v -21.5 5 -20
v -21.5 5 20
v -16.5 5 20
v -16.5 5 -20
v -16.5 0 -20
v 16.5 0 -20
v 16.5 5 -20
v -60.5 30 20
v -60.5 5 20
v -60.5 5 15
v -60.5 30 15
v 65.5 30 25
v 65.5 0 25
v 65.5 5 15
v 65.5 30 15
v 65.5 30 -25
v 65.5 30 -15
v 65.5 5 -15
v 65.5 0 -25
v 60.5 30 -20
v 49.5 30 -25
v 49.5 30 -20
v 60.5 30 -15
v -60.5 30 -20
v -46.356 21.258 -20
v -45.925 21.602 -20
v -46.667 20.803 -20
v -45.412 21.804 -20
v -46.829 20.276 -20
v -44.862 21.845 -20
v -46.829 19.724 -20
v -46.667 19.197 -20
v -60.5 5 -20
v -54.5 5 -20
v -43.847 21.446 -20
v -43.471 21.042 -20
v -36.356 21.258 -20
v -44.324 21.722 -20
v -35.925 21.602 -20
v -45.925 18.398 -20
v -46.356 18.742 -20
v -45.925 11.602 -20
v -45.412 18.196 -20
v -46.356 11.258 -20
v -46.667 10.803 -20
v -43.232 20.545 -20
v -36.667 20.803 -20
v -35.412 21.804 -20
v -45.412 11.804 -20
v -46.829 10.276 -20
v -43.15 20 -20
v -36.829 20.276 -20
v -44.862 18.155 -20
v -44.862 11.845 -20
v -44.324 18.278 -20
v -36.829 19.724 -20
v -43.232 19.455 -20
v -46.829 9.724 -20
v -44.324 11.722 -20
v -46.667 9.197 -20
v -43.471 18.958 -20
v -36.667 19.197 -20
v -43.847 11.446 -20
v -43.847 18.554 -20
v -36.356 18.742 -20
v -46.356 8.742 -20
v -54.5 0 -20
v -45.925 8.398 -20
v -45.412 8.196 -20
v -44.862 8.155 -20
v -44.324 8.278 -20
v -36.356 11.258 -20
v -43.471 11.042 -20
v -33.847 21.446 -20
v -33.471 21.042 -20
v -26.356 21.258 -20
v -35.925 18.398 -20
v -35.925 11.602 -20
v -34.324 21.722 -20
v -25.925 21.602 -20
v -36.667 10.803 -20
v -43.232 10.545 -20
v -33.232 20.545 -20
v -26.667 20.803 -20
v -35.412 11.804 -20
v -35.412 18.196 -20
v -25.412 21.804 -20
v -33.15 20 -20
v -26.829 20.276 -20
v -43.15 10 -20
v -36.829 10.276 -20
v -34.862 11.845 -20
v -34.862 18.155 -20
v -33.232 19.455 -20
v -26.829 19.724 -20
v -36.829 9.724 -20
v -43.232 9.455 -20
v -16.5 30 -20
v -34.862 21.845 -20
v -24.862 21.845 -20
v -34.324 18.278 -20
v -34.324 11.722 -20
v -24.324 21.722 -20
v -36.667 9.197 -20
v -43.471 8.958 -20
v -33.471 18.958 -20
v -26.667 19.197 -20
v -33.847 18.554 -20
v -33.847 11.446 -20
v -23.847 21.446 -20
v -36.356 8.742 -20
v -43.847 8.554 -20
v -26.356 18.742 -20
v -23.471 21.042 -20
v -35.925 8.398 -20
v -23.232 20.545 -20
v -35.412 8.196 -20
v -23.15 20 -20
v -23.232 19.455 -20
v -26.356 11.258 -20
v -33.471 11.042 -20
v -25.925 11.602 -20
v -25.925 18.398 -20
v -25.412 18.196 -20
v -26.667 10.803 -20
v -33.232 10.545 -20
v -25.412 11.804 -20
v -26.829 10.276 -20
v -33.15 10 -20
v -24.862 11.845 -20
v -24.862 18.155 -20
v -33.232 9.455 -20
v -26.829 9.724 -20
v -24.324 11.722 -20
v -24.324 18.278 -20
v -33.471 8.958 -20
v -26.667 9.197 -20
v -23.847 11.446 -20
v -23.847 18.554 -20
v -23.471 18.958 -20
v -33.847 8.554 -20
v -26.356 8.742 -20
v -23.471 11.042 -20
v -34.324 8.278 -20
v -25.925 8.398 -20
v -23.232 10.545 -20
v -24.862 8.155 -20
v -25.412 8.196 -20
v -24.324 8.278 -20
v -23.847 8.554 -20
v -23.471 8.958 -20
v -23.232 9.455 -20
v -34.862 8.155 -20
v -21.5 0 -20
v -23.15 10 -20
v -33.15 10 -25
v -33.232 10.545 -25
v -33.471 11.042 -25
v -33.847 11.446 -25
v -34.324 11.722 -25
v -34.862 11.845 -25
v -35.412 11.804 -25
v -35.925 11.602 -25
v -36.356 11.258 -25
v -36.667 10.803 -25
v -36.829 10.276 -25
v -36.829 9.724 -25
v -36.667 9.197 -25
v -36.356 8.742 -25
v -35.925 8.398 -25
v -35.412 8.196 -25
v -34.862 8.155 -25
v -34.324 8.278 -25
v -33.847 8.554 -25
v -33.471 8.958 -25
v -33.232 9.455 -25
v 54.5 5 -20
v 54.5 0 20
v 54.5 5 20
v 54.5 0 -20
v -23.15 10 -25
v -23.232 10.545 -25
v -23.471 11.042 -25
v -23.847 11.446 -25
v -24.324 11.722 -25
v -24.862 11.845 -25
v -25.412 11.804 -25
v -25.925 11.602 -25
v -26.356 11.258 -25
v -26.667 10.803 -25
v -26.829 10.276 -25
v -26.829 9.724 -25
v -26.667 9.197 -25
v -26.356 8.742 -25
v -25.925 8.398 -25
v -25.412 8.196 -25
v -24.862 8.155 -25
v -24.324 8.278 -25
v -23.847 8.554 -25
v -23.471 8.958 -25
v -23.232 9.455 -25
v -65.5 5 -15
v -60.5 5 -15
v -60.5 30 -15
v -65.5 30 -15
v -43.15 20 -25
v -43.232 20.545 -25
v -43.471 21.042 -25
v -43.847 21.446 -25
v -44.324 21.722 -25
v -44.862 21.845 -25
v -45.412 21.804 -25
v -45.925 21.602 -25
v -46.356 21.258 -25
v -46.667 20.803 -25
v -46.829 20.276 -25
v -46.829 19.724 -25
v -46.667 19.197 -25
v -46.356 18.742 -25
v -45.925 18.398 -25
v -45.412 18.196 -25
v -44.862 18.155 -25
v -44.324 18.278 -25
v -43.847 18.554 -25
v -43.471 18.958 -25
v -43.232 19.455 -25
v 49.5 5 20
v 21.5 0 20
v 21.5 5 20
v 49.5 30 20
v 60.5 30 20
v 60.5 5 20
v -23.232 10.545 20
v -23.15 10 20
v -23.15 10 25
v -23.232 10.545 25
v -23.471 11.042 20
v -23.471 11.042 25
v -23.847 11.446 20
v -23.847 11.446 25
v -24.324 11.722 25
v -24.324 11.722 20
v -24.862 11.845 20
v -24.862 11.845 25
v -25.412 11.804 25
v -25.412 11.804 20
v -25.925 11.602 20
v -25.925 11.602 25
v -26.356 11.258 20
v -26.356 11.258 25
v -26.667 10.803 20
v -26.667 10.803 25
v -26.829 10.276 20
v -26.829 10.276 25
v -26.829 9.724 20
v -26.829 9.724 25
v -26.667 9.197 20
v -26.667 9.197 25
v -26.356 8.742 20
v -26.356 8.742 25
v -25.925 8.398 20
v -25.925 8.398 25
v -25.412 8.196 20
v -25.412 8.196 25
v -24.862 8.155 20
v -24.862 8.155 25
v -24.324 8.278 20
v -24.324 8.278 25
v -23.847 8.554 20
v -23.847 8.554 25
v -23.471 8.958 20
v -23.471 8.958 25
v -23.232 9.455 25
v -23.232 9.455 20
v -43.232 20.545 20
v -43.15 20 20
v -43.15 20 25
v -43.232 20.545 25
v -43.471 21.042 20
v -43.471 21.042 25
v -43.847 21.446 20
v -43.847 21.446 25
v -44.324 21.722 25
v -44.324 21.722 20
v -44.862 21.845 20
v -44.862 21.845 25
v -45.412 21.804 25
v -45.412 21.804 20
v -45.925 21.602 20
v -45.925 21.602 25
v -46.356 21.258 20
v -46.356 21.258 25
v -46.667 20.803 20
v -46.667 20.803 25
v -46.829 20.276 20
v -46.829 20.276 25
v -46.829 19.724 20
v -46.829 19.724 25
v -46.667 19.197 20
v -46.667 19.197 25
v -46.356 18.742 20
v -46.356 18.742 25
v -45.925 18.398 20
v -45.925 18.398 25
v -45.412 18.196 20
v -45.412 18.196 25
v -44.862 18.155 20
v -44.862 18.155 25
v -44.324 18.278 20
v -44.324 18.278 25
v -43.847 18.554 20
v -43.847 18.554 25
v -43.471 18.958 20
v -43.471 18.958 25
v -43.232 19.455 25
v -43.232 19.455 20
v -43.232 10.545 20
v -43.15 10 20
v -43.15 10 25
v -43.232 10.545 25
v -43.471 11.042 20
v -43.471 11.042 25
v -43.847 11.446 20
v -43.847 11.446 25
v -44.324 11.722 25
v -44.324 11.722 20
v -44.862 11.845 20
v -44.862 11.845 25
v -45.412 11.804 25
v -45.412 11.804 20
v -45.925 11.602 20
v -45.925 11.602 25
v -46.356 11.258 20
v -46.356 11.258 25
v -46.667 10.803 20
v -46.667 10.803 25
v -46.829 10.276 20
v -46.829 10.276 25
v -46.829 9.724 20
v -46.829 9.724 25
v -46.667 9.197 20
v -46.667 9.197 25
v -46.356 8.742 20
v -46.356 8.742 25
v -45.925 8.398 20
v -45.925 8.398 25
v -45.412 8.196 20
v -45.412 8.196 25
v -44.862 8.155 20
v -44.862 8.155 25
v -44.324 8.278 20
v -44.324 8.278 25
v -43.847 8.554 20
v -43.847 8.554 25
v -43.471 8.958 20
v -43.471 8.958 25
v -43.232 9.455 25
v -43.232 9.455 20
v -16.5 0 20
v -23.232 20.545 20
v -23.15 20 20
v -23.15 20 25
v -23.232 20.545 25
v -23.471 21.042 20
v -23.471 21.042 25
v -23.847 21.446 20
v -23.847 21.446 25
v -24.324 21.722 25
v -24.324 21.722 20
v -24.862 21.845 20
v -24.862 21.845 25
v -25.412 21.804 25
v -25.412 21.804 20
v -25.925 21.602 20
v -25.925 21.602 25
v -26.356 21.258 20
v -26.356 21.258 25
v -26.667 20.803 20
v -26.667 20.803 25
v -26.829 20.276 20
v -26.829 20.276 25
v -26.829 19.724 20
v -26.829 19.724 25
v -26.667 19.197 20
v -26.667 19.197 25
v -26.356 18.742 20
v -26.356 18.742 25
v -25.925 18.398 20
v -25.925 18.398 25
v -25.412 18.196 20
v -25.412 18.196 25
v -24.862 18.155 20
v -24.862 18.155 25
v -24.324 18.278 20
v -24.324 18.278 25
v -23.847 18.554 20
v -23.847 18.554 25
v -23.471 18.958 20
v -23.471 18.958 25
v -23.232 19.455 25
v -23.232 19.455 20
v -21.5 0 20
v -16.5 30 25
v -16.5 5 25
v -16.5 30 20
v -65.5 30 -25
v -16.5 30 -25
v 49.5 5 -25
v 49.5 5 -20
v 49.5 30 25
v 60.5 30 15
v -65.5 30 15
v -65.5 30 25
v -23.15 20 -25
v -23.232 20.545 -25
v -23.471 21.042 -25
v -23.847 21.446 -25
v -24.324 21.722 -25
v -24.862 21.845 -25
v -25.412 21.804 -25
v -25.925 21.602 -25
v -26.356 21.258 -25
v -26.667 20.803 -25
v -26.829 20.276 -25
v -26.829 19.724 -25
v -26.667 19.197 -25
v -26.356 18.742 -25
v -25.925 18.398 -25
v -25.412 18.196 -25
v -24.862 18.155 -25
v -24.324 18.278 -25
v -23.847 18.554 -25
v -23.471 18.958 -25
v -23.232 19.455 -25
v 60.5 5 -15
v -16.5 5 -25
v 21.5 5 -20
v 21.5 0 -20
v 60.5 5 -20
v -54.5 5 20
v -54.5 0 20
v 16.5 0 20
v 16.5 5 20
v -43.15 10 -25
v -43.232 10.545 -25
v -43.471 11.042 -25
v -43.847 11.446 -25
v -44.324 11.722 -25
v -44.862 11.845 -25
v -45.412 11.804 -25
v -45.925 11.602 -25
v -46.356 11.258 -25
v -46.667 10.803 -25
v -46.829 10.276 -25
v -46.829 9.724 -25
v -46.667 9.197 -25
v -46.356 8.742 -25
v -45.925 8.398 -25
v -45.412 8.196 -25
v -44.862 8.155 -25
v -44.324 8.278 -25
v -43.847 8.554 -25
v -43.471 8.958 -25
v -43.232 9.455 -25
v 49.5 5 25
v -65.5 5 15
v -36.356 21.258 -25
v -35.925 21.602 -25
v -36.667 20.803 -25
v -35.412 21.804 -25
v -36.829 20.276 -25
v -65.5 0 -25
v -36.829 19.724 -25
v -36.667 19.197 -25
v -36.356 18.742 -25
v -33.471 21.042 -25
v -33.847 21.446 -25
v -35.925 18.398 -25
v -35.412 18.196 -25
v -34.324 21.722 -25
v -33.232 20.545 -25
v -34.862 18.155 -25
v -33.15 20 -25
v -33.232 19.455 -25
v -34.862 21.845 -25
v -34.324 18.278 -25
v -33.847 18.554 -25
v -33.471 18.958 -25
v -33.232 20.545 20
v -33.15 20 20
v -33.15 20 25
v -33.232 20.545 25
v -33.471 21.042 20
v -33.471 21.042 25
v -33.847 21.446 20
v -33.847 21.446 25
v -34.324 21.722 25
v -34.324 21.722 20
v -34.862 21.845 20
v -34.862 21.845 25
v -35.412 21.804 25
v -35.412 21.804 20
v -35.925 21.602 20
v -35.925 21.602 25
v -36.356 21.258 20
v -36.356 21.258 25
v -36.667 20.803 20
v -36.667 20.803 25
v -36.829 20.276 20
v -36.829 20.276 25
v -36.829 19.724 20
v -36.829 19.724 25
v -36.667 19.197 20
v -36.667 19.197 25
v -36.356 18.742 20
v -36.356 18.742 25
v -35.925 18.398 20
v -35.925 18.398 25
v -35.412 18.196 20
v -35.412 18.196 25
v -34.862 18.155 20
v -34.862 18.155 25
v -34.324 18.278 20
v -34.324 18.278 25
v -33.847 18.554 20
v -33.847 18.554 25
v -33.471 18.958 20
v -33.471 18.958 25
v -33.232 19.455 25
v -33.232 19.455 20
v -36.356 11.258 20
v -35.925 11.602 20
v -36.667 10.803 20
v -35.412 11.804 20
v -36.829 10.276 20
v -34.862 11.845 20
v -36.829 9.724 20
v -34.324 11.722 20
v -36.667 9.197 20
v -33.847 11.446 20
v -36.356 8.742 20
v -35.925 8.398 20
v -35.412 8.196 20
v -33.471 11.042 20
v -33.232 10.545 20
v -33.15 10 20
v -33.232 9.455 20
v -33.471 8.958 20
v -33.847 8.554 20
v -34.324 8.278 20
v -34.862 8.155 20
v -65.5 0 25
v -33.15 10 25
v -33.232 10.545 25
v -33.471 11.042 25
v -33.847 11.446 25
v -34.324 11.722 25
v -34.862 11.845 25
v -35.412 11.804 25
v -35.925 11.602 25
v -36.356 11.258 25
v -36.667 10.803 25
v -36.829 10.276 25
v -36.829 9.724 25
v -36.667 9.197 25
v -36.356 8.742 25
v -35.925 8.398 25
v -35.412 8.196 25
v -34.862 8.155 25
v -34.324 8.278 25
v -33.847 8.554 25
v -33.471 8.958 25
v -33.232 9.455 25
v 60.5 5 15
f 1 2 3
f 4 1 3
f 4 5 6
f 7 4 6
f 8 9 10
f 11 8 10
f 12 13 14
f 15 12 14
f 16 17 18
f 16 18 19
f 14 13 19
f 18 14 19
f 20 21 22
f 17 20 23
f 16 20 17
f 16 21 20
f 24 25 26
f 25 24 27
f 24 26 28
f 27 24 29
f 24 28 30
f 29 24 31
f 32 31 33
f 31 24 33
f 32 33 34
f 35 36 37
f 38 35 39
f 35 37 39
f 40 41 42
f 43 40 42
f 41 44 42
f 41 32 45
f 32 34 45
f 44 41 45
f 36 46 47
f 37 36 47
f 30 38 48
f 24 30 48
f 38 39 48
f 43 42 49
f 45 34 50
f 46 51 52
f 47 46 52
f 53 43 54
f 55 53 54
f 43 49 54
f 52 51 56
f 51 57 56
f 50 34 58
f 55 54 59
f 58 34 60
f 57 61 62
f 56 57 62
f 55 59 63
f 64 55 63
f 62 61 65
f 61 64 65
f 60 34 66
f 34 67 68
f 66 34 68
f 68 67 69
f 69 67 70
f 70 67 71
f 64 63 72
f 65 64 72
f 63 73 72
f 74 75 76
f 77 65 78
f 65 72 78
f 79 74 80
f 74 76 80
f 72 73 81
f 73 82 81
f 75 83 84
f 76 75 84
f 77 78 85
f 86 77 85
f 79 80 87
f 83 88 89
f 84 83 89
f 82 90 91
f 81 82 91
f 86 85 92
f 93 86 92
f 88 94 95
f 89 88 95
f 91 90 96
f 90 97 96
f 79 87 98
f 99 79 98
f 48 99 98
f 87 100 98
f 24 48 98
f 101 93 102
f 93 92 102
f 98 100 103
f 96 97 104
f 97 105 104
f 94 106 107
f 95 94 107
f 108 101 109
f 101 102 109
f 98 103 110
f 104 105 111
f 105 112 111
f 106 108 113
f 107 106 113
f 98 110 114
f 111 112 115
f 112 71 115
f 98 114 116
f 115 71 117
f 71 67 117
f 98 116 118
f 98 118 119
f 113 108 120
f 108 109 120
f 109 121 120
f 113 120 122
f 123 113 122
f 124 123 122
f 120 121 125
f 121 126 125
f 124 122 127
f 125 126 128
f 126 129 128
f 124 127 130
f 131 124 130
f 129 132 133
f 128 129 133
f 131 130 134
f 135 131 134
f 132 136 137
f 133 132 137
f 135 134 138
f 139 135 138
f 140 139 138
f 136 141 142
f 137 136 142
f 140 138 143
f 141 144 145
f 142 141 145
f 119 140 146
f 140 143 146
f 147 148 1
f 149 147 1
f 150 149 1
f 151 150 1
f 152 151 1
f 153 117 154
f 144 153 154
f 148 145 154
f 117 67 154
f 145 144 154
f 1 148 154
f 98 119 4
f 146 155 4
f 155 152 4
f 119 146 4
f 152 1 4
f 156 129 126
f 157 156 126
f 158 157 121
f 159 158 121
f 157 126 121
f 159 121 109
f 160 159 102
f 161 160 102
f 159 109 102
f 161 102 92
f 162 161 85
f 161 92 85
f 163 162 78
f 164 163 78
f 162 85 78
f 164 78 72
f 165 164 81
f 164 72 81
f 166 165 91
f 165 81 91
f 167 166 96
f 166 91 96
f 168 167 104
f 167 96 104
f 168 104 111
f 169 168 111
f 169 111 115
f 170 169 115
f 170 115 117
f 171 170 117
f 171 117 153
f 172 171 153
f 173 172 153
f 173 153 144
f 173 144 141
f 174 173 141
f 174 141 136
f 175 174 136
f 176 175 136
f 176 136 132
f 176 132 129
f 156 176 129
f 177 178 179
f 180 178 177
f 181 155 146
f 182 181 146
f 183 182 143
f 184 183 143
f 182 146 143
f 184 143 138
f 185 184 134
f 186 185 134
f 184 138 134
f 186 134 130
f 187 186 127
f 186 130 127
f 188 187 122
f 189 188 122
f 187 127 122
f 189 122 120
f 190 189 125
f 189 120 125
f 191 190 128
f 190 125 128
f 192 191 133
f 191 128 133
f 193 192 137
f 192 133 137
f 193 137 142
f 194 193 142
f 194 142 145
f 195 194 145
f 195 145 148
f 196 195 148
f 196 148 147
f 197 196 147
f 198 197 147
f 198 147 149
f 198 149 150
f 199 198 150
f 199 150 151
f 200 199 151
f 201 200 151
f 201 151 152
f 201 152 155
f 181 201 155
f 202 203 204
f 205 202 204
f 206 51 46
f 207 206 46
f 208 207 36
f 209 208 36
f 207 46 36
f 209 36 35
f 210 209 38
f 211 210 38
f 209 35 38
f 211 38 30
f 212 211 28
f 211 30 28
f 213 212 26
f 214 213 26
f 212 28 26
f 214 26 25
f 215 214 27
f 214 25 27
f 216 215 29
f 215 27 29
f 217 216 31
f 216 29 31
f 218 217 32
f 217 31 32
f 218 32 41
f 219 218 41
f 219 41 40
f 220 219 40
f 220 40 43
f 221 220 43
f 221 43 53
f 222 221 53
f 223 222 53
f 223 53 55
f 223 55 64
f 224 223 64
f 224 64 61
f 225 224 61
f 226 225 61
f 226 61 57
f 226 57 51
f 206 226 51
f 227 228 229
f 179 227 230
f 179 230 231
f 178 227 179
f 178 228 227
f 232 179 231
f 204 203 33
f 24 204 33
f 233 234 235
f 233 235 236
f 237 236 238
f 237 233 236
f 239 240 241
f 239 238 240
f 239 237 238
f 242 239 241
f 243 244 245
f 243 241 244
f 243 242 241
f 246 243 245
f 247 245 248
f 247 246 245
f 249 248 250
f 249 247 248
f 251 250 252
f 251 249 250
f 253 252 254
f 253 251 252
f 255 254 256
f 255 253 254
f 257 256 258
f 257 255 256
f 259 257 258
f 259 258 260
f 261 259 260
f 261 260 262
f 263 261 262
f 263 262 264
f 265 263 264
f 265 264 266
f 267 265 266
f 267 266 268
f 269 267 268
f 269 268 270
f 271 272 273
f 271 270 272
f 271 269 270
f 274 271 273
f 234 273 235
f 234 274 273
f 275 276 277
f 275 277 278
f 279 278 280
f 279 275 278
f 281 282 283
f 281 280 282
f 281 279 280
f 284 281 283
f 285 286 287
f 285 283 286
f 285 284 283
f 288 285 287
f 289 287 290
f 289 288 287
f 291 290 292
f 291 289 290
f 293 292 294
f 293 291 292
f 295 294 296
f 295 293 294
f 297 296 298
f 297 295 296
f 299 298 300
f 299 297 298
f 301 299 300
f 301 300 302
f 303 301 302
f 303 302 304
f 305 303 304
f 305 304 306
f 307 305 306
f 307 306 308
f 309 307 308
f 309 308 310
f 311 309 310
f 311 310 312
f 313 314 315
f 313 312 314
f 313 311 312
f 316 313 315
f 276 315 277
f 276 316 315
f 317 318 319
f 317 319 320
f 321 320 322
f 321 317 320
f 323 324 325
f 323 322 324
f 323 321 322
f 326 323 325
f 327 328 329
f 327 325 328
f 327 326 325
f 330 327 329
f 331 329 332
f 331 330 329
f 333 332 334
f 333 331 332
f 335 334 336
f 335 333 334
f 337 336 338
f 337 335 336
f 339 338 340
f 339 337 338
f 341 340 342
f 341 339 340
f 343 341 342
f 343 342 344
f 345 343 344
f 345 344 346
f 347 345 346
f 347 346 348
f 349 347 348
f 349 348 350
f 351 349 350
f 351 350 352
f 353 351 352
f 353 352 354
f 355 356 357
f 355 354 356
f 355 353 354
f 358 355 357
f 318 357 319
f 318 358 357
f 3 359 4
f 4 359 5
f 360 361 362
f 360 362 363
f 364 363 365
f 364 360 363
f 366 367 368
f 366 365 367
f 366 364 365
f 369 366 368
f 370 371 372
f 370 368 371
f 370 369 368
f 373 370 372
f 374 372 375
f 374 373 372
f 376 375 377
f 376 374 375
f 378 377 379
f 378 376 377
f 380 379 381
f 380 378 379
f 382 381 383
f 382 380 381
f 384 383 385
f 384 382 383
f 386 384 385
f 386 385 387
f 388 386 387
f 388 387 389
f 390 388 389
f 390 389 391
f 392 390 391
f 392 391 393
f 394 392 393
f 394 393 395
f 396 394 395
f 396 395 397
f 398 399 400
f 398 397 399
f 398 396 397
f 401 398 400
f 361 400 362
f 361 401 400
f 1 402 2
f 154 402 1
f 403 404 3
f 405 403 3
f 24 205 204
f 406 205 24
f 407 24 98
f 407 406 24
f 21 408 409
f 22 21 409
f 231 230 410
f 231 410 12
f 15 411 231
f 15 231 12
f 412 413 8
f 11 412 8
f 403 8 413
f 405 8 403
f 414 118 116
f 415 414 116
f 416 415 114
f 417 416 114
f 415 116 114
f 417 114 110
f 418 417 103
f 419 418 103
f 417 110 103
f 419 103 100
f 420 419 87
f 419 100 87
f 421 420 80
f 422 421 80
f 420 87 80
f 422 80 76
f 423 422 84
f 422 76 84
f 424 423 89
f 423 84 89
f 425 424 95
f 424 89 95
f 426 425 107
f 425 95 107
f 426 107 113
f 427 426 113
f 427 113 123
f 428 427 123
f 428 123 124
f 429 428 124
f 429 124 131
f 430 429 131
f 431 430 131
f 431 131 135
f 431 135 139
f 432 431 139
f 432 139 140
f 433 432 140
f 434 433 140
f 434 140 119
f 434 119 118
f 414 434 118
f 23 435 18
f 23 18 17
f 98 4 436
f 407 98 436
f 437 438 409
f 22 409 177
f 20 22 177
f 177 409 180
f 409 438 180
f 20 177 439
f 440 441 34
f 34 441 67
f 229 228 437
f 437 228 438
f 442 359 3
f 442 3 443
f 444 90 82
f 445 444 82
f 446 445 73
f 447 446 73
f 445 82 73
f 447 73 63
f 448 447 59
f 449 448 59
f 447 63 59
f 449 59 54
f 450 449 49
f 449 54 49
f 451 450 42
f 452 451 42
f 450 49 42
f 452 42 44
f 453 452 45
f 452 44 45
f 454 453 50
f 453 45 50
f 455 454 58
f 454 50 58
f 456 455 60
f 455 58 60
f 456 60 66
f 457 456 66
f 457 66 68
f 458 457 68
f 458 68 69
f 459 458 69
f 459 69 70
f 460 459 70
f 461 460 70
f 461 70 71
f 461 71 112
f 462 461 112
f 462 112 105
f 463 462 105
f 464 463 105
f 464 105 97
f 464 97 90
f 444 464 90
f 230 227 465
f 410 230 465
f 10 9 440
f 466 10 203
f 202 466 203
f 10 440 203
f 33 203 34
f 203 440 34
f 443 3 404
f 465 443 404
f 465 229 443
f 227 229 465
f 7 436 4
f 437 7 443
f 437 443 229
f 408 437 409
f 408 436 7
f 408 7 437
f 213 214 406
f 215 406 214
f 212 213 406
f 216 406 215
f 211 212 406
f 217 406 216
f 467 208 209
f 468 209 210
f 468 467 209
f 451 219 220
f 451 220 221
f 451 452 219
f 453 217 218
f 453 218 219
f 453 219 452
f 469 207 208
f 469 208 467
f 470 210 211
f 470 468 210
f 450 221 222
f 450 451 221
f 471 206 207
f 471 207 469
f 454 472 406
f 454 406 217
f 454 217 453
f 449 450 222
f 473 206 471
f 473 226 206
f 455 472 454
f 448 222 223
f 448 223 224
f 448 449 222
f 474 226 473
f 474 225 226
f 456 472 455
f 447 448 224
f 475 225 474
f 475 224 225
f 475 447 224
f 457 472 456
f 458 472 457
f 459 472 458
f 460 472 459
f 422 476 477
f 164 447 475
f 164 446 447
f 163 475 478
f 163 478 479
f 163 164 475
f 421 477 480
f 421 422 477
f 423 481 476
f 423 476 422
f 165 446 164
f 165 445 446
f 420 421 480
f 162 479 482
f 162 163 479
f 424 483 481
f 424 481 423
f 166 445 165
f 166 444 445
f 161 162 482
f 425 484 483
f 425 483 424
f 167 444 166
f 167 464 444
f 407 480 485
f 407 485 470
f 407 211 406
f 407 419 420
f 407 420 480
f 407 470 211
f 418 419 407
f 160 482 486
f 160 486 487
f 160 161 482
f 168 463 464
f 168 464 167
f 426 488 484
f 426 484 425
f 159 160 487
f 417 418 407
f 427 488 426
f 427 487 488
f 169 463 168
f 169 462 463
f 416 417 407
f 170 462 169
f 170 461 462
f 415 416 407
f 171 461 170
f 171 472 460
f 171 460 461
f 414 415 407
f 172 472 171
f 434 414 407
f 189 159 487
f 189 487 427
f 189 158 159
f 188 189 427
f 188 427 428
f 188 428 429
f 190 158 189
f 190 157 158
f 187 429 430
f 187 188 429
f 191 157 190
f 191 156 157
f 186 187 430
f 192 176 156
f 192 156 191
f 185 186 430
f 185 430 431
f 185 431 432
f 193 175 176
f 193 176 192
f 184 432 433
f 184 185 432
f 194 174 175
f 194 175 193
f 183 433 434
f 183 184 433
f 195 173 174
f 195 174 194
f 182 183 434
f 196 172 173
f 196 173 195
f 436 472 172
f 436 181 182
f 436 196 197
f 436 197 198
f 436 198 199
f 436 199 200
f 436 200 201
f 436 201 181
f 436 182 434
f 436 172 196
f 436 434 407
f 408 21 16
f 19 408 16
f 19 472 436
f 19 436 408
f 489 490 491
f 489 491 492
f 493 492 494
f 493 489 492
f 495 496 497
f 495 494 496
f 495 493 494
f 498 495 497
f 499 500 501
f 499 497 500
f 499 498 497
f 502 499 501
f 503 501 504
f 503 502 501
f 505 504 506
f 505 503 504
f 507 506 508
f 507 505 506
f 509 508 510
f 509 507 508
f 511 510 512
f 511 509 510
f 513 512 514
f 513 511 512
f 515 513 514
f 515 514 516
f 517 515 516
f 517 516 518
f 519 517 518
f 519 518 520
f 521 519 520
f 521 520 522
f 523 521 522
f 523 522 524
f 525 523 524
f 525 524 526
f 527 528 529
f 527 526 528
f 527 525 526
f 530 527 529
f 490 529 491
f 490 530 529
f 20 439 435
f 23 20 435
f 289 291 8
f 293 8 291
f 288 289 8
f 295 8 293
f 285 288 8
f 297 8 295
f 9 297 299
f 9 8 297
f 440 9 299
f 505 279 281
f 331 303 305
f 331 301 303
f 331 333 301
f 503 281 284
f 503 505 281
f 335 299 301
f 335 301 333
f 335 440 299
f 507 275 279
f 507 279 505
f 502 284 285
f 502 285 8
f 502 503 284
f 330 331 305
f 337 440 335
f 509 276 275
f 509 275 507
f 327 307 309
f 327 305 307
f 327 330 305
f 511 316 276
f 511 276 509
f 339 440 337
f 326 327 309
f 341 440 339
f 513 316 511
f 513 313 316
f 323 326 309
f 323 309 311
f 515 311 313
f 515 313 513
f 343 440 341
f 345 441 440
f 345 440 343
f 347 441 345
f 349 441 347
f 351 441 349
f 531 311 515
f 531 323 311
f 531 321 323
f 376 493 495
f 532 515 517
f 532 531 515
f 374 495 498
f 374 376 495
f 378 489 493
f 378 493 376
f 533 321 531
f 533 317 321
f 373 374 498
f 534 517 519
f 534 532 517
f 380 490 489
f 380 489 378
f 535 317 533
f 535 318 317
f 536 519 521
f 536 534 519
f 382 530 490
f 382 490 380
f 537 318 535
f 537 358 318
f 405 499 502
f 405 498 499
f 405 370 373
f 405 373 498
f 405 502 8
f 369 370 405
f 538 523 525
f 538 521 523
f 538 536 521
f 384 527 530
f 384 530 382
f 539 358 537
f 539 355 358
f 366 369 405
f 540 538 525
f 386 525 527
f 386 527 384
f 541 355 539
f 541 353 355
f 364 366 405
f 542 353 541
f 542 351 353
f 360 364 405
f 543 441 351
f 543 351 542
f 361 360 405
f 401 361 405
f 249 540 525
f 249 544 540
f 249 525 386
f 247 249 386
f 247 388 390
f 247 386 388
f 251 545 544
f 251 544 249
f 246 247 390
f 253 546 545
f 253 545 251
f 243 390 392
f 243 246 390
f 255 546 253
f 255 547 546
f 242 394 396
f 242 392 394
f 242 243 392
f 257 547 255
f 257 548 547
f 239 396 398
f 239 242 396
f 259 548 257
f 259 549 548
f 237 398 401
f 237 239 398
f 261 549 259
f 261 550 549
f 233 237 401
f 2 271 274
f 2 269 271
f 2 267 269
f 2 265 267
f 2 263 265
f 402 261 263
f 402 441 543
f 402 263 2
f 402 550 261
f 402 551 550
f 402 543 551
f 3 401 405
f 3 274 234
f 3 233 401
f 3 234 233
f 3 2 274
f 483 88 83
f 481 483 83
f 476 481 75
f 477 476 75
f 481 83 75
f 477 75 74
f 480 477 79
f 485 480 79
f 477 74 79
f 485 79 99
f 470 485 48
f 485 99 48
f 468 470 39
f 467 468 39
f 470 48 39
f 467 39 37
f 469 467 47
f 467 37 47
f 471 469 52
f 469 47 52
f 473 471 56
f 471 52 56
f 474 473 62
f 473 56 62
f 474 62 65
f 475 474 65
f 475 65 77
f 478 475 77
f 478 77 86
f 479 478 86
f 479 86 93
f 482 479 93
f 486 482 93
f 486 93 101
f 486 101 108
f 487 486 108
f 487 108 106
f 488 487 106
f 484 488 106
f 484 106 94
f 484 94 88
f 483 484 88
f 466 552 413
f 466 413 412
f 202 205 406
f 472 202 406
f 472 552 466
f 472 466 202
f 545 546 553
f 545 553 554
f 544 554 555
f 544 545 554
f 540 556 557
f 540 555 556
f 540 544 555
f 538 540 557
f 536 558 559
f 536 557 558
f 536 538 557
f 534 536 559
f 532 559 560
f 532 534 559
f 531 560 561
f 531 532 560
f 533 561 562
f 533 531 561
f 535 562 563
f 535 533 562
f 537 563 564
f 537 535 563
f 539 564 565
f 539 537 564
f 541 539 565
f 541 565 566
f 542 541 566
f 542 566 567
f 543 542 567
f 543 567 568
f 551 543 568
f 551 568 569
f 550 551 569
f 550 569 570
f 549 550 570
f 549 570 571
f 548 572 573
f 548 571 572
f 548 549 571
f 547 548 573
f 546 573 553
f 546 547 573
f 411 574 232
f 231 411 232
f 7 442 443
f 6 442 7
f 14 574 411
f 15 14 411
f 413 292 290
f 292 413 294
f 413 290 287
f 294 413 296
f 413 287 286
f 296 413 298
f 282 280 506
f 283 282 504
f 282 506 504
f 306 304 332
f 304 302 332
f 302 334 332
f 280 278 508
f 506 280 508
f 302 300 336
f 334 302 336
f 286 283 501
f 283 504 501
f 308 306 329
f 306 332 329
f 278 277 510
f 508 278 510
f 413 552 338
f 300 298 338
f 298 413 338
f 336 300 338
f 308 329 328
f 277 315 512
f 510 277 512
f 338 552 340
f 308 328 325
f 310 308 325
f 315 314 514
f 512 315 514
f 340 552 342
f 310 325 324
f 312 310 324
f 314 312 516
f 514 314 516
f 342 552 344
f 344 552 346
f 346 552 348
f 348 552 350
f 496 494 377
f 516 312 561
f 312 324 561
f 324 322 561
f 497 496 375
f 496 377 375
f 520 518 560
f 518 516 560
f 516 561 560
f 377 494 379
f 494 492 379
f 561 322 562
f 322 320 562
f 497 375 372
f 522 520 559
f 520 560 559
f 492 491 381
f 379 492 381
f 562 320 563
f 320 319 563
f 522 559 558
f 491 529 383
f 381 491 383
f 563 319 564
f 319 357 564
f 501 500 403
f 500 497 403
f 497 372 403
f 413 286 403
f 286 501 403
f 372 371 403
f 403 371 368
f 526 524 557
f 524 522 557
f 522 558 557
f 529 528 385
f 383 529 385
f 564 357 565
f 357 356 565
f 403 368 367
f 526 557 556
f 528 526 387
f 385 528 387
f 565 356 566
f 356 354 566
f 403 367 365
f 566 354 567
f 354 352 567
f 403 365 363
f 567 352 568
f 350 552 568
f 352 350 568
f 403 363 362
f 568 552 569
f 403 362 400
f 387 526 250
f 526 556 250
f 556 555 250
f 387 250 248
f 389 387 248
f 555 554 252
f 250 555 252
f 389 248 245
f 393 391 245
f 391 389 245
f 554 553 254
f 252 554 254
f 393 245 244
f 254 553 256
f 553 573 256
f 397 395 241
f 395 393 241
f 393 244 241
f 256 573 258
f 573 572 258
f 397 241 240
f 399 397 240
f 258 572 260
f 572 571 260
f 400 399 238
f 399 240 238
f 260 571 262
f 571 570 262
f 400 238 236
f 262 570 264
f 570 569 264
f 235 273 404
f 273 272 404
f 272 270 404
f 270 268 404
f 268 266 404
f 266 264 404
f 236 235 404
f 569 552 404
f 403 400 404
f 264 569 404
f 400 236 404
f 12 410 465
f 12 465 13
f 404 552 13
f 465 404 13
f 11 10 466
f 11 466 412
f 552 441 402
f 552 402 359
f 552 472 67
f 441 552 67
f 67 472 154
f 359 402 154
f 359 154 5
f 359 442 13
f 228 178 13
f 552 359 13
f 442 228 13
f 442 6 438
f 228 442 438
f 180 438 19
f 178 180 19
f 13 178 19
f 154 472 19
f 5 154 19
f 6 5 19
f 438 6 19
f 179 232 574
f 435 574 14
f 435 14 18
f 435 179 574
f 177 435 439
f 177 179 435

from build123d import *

# Parameters (mm, degrees)
SKETCH1_W                = 131
SKETCH1_H                = 50
BOSS_EXTRUDE6_DEPTH      = 5
SKETCH11_W               = 33
SKETCH11_H               = 40
CUT_EXTRUDE7_DEPTH       = 5
BOSS_EXTRUDE7_DEPTH      = 30
SKETCH13_W               = 30
SKETCH13_H               = 25
CUT_EXTRUDE8_DEPTH       = 66.5
CUT_EXTRUDE8_DEPTH_BACK  = 66.5
SKETCH15_R               = 1.85
CUT_EXTRUDE10_DEPTH      = 26
CUT_EXTRUDE10_DEPTH_BACK = 26


with BuildPart() as part:
    # Sketch1 → Boss-Extrude6 (new body)
    with BuildSketch(Plane(origin=(0, 0, 0), x_dir=(1, 0, 0), z_dir=(0, 1, 0))):
        Rectangle(SKETCH1_W, SKETCH1_H)
    extrude(amount=BOSS_EXTRUDE6_DEPTH)

    # Sketch11 → Cut-Extrude7 (cut)
    with BuildSketch(Plane(origin=(0, 0, 0), x_dir=(1, 0, 0), z_dir=(0, 1, 0))):
        with Locations((38, 0)):
            Rectangle(SKETCH11_W, SKETCH11_H)
        Rectangle(SKETCH11_W, SKETCH11_H)
        with Locations((-38, 0)):
            Rectangle(SKETCH11_W, SKETCH11_H)
    extrude(amount=CUT_EXTRUDE7_DEPTH, mode=Mode.SUBTRACT)

    # Sketch12 → Boss-Extrude7 (add)
    with BuildSketch(Plane(origin=(0, 0, 0), x_dir=(1, 0, 0), z_dir=(0, 1, 0))):
        Polygon((-65.5, -20), (-65.5, -25), (-59, -25), (-16.5, -25), (-16.5, -20), (-60.5, -20), (-60.5, 20), (-16.5, 20), (-16.5, 25), (-59, 25), (-65.5, 25), (-65.5, 20), align=None)
        Polygon((49.5, 25), (49.5, 20), (60.5, 20), (60.5, -20), (49.5, -20), (49.5, -25), (65.5, -25), (65.5, 25), align=None)
    extrude(amount=BOSS_EXTRUDE7_DEPTH)

    # Sketch13 → Cut-Extrude8 (cut, two sides)
    with BuildSketch(Plane(origin=(0, 0, 0), x_dir=(0, 0, -1), z_dir=(1, 0, 0))) as cut_extrude8_sk:
        with Locations((0, 17.5)):
            Rectangle(SKETCH13_W, SKETCH13_H)
    extrude(amount=CUT_EXTRUDE8_DEPTH, mode=Mode.SUBTRACT)
    extrude(cut_extrude8_sk.sketch, amount=-CUT_EXTRUDE8_DEPTH_BACK, mode=Mode.SUBTRACT)

    # Sketch15 → Cut-Extrude10 (cut, two sides)
    with BuildSketch(Plane.XY) as cut_extrude10_sk:
        with Locations((-35, 10)):
            Circle(SKETCH15_R)
        with Locations((-35, 20)):
            Circle(SKETCH15_R)
        with Locations((-25, 20)):
            Circle(SKETCH15_R)
        with Locations((-25, 10)):
            Circle(SKETCH15_R)
        with Locations((-45, 20)):
            Circle(SKETCH15_R)
        with Locations((-45, 10)):
            Circle(SKETCH15_R)
    extrude(amount=CUT_EXTRUDE10_DEPTH, mode=Mode.SUBTRACT)
    extrude(cut_extrude10_sk.sketch, amount=-CUT_EXTRUDE10_DEPTH_BACK, mode=Mode.SUBTRACT)


solid = part.part
